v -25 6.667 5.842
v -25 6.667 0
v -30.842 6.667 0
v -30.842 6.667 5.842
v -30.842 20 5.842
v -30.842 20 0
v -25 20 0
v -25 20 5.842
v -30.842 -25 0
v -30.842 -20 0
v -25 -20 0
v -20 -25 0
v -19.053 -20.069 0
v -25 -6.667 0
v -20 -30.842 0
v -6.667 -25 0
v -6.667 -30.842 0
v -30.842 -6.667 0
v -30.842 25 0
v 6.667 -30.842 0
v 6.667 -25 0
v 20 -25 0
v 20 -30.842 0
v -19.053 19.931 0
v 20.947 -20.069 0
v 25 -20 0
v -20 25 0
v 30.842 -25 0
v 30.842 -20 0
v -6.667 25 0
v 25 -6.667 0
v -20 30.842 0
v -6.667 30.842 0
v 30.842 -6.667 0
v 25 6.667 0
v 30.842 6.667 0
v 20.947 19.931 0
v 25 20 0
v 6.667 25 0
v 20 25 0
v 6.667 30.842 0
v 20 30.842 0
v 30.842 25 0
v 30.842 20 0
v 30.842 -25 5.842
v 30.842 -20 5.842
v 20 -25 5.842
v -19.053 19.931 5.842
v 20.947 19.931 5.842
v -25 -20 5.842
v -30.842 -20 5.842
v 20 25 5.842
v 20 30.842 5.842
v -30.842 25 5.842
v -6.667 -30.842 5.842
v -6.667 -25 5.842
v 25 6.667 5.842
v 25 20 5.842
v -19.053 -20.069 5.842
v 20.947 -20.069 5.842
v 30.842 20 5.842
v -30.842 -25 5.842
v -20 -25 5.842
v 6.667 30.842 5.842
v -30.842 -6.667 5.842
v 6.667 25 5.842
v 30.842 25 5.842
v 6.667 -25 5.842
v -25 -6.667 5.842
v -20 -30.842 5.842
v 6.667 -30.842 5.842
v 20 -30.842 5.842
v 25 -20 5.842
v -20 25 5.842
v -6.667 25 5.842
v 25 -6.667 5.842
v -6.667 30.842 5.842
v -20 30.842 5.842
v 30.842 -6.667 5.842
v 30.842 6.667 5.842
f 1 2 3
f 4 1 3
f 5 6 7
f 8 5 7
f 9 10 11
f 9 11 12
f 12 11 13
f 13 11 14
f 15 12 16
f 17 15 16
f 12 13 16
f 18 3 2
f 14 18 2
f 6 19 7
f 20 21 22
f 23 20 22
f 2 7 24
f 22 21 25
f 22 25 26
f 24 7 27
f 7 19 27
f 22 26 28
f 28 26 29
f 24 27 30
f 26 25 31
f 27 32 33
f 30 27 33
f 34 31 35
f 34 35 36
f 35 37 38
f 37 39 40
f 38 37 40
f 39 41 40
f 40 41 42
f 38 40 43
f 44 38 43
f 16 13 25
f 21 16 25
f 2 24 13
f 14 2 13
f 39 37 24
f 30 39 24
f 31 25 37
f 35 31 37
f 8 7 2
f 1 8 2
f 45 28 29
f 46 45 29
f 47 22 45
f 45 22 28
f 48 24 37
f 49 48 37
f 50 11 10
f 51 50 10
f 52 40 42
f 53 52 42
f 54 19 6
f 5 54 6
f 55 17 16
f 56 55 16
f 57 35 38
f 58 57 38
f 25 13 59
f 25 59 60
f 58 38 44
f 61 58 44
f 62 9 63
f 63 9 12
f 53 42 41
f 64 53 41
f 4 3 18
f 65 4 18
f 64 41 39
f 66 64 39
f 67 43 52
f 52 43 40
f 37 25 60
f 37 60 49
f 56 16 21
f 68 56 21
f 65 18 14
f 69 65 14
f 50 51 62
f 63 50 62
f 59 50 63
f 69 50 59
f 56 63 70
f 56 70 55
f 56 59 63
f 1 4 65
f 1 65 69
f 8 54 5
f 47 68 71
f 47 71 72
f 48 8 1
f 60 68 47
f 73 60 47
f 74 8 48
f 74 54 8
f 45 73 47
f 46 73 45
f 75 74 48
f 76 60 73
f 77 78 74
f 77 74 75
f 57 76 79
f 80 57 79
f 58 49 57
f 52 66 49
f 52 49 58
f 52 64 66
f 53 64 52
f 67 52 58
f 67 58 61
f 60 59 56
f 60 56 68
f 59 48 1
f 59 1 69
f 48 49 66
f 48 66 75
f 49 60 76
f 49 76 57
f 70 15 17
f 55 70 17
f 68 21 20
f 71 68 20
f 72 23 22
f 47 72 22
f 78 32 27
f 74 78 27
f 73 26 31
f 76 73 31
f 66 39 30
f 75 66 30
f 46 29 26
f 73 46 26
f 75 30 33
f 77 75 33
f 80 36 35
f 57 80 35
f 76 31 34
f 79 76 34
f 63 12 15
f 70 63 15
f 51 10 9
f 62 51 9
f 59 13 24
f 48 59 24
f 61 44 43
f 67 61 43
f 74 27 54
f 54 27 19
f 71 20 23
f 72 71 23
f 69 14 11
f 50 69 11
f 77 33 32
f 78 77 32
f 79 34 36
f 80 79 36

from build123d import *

# Parameters (mm, degrees)
F0_W     = 40
F0_H     = 40
F1_DEPTH = 5.842


with BuildPart() as f1:
    # F0 (on Top) → F1 (new body)
    with BuildSketch(Plane.XY):
        Polygon((-20, 25), (-25, 25), (-30.842, 25), (-30.842, 20), (-25, 20), (-25, 6.666667), (-30.842, 6.666667), (-30.842, -6.666667), (-25, -6.666667), (-25, -20), (-30.842, -20), (-30.842, -25), (-25, -25), (-20, -25), (-20, -30.842), (-6.666667, -30.842), (-6.666667, -25), (6.666667, -25), (6.666667, -30.842), (20, -30.842), (20, -25), (25, -25), (30.842, -25), (30.842, -20), (25, -20), (25, -6.666667), (30.842, -6.666667), (30.842, 6.666667), (25, 6.666667), (25, 20), (30.842, 20), (30.842, 25), (25, 25), (20, 25), (20, 30.842), (6.666667, 30.842), (6.666667, 25), (-6.666667, 25), (-6.666667, 30.842), (-20, 30.842), align=None)
        with Locations((0.947482, -0.06855)):
            Rectangle(F0_W, F0_H, mode=Mode.SUBTRACT)
    extrude(amount=F1_DEPTH)


solid = f1.part
